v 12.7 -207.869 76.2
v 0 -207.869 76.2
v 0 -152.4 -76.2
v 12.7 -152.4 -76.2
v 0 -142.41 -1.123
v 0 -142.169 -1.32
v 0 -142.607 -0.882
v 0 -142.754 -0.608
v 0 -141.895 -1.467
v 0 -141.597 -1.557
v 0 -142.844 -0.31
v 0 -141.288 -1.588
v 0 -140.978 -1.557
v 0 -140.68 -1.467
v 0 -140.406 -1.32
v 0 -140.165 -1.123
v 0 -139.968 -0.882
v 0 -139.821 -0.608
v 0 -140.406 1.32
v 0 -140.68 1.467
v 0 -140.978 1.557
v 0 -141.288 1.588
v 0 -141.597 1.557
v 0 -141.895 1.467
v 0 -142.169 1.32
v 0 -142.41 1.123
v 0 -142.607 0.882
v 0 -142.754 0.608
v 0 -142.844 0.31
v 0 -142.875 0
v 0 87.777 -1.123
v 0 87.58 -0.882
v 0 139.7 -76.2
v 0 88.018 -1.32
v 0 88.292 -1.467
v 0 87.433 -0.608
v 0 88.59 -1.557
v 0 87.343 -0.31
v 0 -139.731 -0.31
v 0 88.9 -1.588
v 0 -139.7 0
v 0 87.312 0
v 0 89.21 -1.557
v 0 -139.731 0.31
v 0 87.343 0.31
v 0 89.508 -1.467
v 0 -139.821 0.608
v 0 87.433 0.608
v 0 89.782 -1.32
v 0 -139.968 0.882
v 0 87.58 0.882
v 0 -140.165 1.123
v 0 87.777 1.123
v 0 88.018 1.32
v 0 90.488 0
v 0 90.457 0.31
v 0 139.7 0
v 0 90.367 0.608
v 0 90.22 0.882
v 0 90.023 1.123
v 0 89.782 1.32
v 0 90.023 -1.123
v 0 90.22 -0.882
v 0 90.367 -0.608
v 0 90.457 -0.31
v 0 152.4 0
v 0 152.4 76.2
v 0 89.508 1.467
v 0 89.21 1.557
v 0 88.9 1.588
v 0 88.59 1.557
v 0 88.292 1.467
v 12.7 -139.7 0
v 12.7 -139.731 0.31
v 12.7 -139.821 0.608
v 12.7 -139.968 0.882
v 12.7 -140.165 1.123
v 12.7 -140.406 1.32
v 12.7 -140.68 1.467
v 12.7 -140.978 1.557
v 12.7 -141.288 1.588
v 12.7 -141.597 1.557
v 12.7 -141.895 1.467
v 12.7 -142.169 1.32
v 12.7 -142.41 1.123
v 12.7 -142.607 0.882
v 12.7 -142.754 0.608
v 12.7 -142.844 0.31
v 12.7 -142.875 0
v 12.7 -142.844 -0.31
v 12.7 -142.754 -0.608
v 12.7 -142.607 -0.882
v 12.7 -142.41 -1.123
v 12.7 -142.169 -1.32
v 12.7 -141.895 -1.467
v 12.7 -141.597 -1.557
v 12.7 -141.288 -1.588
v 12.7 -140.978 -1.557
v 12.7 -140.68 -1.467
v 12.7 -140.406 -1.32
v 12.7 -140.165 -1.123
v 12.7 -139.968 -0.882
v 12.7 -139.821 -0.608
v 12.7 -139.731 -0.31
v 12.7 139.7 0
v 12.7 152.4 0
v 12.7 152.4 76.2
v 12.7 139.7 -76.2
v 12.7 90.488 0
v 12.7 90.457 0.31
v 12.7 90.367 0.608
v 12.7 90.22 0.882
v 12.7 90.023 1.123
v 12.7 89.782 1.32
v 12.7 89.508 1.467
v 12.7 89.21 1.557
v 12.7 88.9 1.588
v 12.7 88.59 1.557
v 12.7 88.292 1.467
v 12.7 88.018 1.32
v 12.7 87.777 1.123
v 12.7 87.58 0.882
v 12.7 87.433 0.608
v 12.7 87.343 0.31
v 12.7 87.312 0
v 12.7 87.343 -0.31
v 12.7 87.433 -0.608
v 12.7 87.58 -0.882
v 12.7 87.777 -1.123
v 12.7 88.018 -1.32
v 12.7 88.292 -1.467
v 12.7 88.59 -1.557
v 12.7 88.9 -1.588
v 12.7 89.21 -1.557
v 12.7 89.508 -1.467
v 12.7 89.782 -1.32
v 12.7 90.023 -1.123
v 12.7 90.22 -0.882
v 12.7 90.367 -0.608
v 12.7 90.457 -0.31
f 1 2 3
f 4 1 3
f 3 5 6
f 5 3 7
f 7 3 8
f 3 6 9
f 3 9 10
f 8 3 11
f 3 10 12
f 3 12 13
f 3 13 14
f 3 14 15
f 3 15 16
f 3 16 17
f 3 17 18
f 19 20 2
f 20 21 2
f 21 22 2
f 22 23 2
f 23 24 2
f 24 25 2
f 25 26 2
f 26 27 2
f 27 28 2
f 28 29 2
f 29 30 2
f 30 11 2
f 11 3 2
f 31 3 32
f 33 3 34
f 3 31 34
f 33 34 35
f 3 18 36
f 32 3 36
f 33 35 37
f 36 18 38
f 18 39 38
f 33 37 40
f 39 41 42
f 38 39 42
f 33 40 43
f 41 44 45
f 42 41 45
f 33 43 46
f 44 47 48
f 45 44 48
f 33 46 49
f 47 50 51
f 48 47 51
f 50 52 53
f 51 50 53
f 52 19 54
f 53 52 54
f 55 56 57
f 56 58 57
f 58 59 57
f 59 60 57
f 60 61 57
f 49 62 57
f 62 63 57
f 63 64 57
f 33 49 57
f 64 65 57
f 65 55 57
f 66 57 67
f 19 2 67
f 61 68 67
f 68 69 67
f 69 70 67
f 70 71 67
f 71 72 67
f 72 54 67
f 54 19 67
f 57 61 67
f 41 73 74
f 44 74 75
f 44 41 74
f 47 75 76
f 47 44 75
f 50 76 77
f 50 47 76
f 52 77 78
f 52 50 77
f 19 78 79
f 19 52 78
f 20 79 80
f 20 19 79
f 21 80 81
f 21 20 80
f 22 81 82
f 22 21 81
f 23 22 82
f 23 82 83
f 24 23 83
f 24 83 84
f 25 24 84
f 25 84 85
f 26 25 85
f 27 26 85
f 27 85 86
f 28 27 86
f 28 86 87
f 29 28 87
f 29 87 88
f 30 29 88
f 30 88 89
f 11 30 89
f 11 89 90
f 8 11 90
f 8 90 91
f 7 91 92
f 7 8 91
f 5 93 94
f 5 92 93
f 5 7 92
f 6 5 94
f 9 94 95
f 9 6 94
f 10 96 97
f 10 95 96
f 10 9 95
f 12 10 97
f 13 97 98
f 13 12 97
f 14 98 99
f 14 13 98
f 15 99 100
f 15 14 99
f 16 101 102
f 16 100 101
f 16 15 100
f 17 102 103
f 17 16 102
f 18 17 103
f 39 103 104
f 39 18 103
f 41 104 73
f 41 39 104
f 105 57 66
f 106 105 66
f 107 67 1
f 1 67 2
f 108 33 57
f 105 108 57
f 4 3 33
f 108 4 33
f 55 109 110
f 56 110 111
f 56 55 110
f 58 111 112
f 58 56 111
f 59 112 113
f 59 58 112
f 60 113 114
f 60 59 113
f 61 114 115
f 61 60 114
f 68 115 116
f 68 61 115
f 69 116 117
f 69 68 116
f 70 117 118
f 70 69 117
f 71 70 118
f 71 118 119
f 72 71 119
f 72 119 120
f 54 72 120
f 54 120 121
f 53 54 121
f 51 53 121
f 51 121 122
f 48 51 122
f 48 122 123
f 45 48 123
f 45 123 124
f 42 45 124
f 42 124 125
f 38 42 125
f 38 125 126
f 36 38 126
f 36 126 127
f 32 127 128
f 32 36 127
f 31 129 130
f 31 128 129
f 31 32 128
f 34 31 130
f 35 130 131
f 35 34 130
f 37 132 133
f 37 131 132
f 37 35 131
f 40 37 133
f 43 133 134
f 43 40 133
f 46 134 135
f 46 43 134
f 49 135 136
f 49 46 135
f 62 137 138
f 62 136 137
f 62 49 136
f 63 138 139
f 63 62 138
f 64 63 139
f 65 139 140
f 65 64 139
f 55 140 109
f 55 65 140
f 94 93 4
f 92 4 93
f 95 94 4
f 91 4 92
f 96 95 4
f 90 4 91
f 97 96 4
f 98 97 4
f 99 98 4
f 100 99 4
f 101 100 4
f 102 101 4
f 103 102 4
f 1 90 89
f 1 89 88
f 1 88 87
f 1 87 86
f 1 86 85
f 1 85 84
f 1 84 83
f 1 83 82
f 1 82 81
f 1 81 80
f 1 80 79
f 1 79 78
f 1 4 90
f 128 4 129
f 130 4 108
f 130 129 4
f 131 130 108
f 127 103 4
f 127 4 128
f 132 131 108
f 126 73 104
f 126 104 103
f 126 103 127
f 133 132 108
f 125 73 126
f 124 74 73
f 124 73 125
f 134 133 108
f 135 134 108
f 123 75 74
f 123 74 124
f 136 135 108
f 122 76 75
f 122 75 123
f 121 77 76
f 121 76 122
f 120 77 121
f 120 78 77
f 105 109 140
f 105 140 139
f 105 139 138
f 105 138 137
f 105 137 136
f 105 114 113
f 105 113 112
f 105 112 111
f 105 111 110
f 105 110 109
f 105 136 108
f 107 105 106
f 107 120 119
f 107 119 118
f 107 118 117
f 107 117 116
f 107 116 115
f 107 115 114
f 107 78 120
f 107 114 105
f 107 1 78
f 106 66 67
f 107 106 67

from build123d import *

# Parameters (mm, degrees)
F2_DEPTH = 12.7
F3_R     = 1.5875
F4_DEPTH = 12.701


# Not quite as in the source:
# - a feature names something its author has since deleted; it is built from what else it names


with BuildPart() as f2:
    # F1 (on face) → F2 (new body)
    with BuildSketch(Plane.YZ):
        Polygon((-152.4, -76.2), (139.7, -76.2), (139.7, 0), (152.4, 0), (152.4, 76.2), (-152.4, 76.2), (-207.8690637022, 76.2), align=None)
    extrude(amount=F2_DEPTH)

    # F3 (on face) → F4 (cut, through all)
    with BuildSketch(Plane.YZ):
        with Locations((-141.2875, 0)):
            Circle(F3_R)
        with Locations((88.9, 0)):
            Circle(F3_R)
    extrude(amount=F4_DEPTH, mode=Mode.SUBTRACT)


solid = f2.part
